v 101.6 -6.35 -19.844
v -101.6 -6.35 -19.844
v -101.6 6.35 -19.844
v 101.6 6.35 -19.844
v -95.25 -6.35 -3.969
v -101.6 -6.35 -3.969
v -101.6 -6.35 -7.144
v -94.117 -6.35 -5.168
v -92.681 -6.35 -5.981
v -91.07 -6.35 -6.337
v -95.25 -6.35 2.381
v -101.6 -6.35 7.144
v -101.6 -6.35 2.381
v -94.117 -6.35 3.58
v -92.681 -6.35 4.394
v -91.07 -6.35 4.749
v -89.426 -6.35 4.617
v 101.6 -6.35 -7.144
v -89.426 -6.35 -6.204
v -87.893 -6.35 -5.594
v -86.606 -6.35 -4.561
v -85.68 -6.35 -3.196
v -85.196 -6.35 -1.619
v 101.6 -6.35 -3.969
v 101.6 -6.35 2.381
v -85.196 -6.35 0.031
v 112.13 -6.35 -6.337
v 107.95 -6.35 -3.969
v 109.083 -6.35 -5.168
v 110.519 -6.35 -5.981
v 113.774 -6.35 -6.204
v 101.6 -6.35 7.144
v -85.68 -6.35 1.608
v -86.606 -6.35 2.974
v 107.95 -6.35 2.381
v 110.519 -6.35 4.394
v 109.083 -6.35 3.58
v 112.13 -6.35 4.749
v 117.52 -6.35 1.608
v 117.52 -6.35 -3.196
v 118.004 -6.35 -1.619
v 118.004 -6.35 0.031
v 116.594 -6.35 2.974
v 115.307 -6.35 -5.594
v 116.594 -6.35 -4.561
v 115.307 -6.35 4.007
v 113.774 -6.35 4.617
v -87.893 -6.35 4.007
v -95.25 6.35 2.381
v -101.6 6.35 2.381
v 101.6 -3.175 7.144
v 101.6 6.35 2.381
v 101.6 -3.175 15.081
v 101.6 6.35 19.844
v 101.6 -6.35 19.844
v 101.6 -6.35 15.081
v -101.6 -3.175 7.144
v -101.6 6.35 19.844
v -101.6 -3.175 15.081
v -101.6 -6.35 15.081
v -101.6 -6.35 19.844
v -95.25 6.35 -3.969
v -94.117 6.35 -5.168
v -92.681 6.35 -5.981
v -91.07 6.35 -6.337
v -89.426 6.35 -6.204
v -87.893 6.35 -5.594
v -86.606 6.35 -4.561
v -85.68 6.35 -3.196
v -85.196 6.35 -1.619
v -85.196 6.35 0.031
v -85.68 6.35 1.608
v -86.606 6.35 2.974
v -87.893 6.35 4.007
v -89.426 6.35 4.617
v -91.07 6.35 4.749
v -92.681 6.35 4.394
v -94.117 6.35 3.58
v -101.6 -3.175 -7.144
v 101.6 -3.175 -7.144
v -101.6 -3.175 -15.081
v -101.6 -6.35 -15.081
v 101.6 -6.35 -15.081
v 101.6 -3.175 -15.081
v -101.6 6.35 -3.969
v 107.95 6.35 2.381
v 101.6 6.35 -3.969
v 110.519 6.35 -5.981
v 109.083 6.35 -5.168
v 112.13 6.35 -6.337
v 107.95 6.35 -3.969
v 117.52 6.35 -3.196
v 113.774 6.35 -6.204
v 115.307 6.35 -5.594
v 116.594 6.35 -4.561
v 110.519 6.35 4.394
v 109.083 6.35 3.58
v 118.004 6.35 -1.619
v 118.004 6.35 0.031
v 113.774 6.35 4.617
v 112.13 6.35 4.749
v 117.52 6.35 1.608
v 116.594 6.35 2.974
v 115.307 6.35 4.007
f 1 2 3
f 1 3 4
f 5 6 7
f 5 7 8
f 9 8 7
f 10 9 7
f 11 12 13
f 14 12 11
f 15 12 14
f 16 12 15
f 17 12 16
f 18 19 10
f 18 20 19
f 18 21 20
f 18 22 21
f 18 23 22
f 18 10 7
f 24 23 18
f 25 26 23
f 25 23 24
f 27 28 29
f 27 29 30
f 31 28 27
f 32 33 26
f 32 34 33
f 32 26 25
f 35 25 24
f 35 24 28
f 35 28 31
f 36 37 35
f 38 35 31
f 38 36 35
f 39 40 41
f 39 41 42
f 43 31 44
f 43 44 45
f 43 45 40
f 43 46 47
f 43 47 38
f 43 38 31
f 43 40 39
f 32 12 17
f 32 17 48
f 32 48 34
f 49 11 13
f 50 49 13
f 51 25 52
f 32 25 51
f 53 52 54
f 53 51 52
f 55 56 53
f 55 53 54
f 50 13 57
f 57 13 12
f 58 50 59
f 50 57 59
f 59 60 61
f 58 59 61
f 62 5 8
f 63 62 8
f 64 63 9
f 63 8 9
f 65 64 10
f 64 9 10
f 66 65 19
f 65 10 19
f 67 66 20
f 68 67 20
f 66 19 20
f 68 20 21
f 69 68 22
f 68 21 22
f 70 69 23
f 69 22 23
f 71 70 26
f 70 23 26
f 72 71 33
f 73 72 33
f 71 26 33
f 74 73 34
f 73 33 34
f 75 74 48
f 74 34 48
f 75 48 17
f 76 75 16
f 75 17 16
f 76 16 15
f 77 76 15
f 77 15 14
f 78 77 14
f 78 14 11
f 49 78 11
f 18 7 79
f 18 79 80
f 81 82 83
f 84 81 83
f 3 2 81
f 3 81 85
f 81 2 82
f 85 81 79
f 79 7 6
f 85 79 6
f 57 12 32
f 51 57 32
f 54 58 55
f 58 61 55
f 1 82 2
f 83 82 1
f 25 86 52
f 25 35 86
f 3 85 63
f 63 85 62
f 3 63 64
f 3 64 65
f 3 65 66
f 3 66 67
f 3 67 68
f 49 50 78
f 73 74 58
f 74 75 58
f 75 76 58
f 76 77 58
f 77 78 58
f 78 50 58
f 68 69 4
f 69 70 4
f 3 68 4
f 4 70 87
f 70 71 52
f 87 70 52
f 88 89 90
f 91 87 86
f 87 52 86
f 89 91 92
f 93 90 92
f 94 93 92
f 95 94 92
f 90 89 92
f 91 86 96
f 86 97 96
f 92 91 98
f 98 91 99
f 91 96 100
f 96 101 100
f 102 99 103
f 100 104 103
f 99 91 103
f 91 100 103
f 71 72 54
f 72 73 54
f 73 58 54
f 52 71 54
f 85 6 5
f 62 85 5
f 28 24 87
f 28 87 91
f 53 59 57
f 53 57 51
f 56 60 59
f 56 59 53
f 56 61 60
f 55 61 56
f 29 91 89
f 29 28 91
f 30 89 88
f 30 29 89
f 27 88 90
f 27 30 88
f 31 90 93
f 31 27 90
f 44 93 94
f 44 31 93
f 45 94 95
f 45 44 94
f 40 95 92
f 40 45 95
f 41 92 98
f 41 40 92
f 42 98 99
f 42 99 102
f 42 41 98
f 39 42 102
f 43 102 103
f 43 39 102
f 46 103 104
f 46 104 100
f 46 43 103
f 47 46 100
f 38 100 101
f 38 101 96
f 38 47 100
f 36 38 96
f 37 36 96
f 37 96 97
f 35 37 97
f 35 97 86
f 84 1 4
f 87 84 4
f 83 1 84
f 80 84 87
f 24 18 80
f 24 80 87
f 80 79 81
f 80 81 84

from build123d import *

# Parameters (mm, degrees)
F0_W     = 203.2
F0_H     = 39.6875
F1_DEPTH = 6.35
F3_DEPTH = 6.35
F5_DEPTH = 12.7
F6_W     = 203.2
F6_H     = 7.9375
F7_DEPTH = 3.175
F8_W     = 203.2
F8_H     = 7.9375
F9_DEPTH = 3.175


with BuildPart() as f1:
    # F0 (on Front) → F1 (new body, symmetric)
    with BuildSketch(Plane.XZ):
        Rectangle(F0_W, F0_H)
    extrude(amount=F1_DEPTH, both=True)

    # F2 (on Front) → F3 (join, symmetric)
    with BuildSketch(Plane.XZ):
        with BuildLine():
            Line((107.95, 2.38125), (101.6, 2.38125))
            Line((101.6, 2.38125), (101.6, -3.96875))
            Line((101.6, -3.96875), (107.95, -3.96875))
            ThreePointArc((107.95, -3.96875), (118.0659966007, -0.79375), (107.95, 2.38125))
        make_face()
    extrude(amount=F3_DEPTH, both=True)

    # F4 (on Front) → F5 (cut, symmetric)
    with BuildSketch(Plane.XZ):
        with BuildLine():
            Line((-95.25, 2.38125), (-101.6, 2.38125))
            Line((-101.6, 2.38125), (-101.6, -3.96875))
            Line((-101.6, -3.96875), (-95.25, -3.96875))
            ThreePointArc((-95.25, -3.96875), (-85.1340033993, -0.79375), (-95.25, 2.38125))
        make_face()
    extrude(amount=F5_DEPTH, both=True, mode=Mode.SUBTRACT)

    # F6 (on face) → F7 (cut)
    with BuildSketch(Plane.XZ.offset(6.35)):
        with Locations((0, 11.1125)):
            Rectangle(F6_W, F6_H)
    extrude(amount=-F7_DEPTH, mode=Mode.SUBTRACT)

    # F8 (on face) → F9 (cut)
    with BuildSketch(Plane.XZ.offset(6.35)):
        with Locations((0, -11.1125)):
            Rectangle(F8_W, F8_H)
    extrude(amount=-F9_DEPTH, mode=Mode.SUBTRACT)


solid = f1.part
